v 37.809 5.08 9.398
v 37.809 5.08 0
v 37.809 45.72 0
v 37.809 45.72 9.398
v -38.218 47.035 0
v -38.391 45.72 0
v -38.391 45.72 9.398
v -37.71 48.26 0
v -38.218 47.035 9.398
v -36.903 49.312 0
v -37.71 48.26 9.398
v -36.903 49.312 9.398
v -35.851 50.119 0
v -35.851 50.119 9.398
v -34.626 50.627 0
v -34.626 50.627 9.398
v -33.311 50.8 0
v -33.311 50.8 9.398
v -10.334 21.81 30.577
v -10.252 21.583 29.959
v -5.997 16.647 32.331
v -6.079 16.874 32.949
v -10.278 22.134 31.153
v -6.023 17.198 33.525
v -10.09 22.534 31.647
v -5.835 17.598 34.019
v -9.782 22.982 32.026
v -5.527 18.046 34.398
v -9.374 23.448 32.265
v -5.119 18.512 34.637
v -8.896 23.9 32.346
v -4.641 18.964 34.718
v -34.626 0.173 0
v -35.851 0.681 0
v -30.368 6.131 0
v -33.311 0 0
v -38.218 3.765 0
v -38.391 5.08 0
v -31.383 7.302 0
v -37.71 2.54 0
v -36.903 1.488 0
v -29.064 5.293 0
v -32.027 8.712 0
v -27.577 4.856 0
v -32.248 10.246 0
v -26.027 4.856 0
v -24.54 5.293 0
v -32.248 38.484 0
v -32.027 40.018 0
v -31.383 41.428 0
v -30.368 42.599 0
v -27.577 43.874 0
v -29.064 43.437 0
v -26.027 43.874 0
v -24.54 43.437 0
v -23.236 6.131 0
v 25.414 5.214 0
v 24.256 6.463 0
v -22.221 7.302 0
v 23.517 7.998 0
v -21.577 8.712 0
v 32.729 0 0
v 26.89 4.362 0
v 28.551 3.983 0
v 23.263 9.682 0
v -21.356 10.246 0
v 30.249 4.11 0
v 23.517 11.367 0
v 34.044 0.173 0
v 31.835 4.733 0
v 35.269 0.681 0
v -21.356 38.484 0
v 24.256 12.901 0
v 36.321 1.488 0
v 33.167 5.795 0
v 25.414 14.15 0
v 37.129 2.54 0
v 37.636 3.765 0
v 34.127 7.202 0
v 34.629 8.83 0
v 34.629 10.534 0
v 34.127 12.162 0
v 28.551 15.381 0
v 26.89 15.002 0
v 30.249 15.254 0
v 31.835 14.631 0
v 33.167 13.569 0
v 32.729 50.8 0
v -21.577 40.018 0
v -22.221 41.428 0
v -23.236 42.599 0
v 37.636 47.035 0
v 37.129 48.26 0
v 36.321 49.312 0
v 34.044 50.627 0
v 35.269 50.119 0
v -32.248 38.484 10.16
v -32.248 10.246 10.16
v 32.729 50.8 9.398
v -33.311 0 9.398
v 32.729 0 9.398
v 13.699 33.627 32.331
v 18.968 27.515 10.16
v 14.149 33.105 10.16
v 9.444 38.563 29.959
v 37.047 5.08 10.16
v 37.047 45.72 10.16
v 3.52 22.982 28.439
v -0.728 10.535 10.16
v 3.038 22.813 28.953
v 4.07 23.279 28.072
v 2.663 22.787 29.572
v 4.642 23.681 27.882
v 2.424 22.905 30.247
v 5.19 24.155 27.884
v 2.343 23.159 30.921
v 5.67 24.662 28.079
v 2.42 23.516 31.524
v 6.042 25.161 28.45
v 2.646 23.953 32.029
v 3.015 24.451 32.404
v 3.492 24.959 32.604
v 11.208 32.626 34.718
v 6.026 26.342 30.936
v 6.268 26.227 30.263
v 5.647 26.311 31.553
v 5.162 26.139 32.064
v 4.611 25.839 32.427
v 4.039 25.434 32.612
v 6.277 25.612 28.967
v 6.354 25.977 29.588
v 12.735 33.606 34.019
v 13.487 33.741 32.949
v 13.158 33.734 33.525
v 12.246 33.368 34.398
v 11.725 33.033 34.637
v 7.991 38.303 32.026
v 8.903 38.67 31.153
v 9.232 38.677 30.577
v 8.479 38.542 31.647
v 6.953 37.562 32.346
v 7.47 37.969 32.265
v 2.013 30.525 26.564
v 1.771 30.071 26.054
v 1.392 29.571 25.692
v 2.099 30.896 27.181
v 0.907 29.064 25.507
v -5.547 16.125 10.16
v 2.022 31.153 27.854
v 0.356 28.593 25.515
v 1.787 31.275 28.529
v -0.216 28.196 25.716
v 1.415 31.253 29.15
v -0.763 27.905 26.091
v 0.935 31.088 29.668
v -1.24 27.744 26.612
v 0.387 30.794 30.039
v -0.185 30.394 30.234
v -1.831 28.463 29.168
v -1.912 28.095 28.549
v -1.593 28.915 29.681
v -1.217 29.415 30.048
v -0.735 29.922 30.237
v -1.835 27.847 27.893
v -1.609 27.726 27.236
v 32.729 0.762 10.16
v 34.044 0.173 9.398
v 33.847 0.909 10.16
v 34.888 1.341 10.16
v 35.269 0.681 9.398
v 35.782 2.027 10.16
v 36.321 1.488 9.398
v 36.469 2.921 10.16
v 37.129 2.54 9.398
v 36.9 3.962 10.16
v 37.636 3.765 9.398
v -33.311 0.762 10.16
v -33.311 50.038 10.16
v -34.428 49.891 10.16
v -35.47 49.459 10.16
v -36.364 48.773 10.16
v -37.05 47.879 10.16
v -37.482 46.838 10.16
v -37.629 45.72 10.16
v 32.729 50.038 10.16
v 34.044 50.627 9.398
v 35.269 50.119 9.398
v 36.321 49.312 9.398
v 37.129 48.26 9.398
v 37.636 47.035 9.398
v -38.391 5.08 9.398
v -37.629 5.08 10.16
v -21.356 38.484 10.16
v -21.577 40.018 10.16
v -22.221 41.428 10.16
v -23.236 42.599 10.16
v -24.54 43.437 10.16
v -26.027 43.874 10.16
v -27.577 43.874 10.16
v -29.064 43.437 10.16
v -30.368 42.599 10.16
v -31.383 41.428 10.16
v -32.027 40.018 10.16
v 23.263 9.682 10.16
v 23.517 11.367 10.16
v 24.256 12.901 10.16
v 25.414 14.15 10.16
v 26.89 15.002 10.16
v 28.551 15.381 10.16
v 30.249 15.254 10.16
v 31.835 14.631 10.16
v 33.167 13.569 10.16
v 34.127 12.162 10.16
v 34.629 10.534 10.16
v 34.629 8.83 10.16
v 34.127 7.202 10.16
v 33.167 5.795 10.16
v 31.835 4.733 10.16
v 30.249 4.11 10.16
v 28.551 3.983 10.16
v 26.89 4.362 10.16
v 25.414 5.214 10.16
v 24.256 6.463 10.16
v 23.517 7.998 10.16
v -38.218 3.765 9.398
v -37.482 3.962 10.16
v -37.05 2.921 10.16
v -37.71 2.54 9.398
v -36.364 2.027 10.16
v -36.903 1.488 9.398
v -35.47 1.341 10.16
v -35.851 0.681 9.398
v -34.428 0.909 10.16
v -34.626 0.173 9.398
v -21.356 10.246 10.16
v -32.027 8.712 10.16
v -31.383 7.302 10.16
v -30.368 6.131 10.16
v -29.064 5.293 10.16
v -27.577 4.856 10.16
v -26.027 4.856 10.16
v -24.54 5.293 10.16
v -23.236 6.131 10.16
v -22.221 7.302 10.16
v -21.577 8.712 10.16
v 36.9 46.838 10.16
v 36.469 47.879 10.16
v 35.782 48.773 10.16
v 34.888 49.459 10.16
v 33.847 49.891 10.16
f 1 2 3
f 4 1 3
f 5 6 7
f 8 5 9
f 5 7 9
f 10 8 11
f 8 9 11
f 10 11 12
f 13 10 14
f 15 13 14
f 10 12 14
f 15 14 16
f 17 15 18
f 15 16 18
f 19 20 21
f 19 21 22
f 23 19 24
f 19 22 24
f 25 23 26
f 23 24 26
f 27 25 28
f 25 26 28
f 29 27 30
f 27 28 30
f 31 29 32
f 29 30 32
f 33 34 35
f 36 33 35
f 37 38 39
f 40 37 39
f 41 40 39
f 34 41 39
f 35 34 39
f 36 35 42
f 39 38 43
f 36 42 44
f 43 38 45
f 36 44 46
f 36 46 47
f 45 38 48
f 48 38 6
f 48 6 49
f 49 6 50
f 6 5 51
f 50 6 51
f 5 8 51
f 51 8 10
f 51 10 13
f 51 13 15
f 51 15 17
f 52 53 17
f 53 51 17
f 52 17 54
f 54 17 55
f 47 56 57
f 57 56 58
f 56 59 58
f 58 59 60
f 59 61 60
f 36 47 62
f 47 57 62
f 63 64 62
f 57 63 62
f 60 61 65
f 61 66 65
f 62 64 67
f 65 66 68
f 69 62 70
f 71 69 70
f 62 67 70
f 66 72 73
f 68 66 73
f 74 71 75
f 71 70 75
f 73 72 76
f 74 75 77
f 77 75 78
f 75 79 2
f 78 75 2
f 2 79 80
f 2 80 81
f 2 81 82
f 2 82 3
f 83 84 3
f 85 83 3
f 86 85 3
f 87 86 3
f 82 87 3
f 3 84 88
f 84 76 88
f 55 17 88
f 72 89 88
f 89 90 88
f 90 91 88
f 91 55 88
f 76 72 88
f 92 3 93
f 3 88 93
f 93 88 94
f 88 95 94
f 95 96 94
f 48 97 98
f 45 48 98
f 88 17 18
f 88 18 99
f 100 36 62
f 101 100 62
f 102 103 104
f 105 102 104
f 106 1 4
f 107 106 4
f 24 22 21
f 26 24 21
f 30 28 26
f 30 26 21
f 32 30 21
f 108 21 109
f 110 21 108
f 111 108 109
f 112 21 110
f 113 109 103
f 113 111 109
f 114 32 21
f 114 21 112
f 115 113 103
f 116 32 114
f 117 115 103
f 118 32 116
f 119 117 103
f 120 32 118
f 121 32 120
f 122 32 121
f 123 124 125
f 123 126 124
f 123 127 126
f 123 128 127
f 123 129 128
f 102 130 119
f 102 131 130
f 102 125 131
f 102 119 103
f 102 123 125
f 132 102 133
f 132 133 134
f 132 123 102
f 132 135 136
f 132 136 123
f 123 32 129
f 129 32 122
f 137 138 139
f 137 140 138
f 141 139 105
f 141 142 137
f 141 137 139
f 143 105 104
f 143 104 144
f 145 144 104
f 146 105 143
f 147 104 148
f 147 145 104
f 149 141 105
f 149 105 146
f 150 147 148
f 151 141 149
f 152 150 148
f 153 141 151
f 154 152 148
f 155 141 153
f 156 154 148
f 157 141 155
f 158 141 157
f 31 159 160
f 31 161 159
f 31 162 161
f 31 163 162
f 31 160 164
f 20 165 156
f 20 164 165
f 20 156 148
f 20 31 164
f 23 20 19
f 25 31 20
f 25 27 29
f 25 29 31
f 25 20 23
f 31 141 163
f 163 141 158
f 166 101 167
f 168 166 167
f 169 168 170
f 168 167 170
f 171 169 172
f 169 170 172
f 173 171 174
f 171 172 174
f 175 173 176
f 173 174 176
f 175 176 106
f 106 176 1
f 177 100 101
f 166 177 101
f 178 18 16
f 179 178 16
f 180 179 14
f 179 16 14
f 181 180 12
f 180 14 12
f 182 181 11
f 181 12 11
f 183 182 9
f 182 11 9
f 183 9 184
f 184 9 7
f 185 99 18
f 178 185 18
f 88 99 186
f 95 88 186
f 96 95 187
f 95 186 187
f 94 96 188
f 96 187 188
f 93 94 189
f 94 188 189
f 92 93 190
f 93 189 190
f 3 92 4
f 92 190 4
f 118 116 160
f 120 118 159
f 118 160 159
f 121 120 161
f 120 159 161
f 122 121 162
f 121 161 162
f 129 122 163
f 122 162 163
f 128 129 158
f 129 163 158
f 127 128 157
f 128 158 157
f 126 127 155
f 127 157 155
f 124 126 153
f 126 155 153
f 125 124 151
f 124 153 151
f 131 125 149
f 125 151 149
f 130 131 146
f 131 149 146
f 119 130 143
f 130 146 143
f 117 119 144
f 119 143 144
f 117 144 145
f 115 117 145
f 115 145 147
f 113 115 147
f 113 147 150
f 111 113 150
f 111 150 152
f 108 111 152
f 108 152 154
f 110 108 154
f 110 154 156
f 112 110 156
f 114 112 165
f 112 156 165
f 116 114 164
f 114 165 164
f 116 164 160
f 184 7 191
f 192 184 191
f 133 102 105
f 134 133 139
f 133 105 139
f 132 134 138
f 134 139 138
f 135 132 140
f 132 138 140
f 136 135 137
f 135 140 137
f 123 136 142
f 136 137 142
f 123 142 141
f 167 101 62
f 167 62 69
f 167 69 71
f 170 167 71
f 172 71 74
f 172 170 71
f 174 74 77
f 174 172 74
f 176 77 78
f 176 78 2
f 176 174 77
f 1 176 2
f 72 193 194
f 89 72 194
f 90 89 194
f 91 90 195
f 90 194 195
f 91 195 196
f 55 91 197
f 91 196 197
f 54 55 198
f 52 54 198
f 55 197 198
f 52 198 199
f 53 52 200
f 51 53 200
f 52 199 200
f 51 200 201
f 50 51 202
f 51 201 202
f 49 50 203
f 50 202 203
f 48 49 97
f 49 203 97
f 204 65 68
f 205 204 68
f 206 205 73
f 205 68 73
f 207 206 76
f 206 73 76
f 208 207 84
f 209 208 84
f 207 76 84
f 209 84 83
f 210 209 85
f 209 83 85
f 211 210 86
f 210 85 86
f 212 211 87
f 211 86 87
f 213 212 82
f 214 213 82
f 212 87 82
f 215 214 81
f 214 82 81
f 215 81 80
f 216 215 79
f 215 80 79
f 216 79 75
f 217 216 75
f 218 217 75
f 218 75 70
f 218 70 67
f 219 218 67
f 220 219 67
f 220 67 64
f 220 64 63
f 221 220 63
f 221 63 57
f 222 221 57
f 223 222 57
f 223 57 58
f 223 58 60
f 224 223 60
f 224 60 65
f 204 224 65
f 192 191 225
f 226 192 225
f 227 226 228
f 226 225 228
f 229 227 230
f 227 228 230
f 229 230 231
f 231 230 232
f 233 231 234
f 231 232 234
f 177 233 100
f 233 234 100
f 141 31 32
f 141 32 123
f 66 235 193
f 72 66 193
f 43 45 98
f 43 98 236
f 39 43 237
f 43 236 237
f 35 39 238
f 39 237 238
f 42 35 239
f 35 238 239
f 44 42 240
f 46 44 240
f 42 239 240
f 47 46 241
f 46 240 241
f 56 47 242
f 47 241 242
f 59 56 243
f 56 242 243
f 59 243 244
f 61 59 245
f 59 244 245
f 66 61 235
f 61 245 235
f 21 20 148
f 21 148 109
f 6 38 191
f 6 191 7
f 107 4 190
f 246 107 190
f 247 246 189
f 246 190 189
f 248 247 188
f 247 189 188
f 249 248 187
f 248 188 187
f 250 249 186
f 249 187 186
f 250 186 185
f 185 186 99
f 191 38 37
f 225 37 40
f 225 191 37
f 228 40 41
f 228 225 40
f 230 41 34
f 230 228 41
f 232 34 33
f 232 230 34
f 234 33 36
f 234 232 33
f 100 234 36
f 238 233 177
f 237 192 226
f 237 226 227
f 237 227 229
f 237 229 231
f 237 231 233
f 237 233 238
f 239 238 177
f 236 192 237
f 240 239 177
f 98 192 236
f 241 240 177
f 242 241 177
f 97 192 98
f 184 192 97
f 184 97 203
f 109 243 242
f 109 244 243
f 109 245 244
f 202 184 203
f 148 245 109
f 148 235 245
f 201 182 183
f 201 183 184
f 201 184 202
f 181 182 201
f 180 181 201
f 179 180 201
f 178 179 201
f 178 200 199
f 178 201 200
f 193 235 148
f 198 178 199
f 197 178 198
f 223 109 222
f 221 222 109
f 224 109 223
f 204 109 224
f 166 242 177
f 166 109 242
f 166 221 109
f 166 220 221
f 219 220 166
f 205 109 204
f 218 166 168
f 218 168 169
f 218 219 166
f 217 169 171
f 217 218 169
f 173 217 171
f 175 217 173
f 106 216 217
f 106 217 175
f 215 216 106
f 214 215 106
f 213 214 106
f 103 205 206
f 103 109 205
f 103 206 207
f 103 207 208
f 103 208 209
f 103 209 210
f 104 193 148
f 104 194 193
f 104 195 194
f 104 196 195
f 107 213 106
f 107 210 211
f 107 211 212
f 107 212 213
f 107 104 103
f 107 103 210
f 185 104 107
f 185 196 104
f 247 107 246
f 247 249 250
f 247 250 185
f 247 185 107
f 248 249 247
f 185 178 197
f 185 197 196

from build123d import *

# Parameters (mm, degrees)
F0_W          = 76.2
F0_H          = 50.8
F1_DEPTH      = 10.16
F5_DEPTH      = 23.60986
F5_DEPTH_BACK = 6.00945
F7_DEPTH      = 25.4
F9_D          = 11.43
F9_DEPTH      = 127
F11_D         = 5.08
F11_DEPTH     = 127
F12_R         = 5.08
F13_SIZE      = 0.762
F14_R         = 2.54


with BuildPart() as f1:
    # F0 (on Top) → F1 (new body)
    with BuildSketch(Plane.XY):
        with Locations((-0.290839, 25.4)):
            Rectangle(F0_W, F0_H)
    extrude(amount=F1_DEPTH)

    # F4 (on face) → F5 (join, two sides)
    with BuildSketch(Plane(origin=(-3.34157, 3.876222, 14.060855), x_dir=(0.974746, 0.059349, 0.215288), z_dir=(-0.223318, 0.259049, 0.939693))) as f5_sk:
        Polygon((17.944019, 29.214139), (-2.262714, 12.845073), (2.102678, 7.456231), (22.309411, 23.825297), align=None)
    extrude(amount=F5_DEPTH)
    extrude(f5_sk.sketch, amount=-F5_DEPTH_BACK)

    # F6 (on face) → F7 (cut)
    with BuildSketch(Plane.XY.offset(10.16)):
        with BuildLine():
            ThreePointArc((-21.356091, 38.483839), (-26.801871, 43.92962), (-32.247651, 38.483839))
            Line((-32.247651, 38.483839), (-32.247651, 10.246455))
            ThreePointArc((-32.247651, 10.246455), (-26.801871, 4.800675), (-21.356091, 10.246455))
            Line((-21.356091, 10.246455), (-21.356091, 38.483839))
        make_face()
    extrude(amount=-F7_DEPTH, mode=Mode.SUBTRACT)

    # F9
    with Locations(Plane.XY.offset(10.16)):
        with Locations((28.977718, 9.68211)):
            Hole(F9_D / 2, depth=F9_DEPTH)

    # F11
    with Locations(Plane(origin=(-2.742742, 3.181581, -1.528896), x_dir=(0.789646, 0.553023, -0.265753), z_dir=(0.613563, -0.711733, 0.34202))):
        with Locations((8.980069, 37.900489)):
            Hole(F11_D / 2, depth=F11_DEPTH)

    # F12
    f12_edges = [f1.edges().sort_by_distance(p)[0] for p in [
        (37.809161, 0, 5.08),
        (37.809161, 50.8, 5.08),
        (-38.390839, 50.8, 5.08),
        (-38.390839, 0, 5.08),
    ]]
    fillet(f12_edges, radius=F12_R)

    # F13
    f13_edges = [f1.edges().sort_by_distance(p)[0] for p in [
        (-0.290839, 0, 10.16),
    ]]
    chamfer(f13_edges, length=F13_SIZE)

    # F14
    f14_edges = [f1.edges().sort_by_distance(p)[0] for p in [
        (-8.692086, 19.773218, 33.531991),
        (11.004337, 36.752892, 33.531991),
    ]]
    fillet(f14_edges, radius=F14_R)


solid = f1.part
